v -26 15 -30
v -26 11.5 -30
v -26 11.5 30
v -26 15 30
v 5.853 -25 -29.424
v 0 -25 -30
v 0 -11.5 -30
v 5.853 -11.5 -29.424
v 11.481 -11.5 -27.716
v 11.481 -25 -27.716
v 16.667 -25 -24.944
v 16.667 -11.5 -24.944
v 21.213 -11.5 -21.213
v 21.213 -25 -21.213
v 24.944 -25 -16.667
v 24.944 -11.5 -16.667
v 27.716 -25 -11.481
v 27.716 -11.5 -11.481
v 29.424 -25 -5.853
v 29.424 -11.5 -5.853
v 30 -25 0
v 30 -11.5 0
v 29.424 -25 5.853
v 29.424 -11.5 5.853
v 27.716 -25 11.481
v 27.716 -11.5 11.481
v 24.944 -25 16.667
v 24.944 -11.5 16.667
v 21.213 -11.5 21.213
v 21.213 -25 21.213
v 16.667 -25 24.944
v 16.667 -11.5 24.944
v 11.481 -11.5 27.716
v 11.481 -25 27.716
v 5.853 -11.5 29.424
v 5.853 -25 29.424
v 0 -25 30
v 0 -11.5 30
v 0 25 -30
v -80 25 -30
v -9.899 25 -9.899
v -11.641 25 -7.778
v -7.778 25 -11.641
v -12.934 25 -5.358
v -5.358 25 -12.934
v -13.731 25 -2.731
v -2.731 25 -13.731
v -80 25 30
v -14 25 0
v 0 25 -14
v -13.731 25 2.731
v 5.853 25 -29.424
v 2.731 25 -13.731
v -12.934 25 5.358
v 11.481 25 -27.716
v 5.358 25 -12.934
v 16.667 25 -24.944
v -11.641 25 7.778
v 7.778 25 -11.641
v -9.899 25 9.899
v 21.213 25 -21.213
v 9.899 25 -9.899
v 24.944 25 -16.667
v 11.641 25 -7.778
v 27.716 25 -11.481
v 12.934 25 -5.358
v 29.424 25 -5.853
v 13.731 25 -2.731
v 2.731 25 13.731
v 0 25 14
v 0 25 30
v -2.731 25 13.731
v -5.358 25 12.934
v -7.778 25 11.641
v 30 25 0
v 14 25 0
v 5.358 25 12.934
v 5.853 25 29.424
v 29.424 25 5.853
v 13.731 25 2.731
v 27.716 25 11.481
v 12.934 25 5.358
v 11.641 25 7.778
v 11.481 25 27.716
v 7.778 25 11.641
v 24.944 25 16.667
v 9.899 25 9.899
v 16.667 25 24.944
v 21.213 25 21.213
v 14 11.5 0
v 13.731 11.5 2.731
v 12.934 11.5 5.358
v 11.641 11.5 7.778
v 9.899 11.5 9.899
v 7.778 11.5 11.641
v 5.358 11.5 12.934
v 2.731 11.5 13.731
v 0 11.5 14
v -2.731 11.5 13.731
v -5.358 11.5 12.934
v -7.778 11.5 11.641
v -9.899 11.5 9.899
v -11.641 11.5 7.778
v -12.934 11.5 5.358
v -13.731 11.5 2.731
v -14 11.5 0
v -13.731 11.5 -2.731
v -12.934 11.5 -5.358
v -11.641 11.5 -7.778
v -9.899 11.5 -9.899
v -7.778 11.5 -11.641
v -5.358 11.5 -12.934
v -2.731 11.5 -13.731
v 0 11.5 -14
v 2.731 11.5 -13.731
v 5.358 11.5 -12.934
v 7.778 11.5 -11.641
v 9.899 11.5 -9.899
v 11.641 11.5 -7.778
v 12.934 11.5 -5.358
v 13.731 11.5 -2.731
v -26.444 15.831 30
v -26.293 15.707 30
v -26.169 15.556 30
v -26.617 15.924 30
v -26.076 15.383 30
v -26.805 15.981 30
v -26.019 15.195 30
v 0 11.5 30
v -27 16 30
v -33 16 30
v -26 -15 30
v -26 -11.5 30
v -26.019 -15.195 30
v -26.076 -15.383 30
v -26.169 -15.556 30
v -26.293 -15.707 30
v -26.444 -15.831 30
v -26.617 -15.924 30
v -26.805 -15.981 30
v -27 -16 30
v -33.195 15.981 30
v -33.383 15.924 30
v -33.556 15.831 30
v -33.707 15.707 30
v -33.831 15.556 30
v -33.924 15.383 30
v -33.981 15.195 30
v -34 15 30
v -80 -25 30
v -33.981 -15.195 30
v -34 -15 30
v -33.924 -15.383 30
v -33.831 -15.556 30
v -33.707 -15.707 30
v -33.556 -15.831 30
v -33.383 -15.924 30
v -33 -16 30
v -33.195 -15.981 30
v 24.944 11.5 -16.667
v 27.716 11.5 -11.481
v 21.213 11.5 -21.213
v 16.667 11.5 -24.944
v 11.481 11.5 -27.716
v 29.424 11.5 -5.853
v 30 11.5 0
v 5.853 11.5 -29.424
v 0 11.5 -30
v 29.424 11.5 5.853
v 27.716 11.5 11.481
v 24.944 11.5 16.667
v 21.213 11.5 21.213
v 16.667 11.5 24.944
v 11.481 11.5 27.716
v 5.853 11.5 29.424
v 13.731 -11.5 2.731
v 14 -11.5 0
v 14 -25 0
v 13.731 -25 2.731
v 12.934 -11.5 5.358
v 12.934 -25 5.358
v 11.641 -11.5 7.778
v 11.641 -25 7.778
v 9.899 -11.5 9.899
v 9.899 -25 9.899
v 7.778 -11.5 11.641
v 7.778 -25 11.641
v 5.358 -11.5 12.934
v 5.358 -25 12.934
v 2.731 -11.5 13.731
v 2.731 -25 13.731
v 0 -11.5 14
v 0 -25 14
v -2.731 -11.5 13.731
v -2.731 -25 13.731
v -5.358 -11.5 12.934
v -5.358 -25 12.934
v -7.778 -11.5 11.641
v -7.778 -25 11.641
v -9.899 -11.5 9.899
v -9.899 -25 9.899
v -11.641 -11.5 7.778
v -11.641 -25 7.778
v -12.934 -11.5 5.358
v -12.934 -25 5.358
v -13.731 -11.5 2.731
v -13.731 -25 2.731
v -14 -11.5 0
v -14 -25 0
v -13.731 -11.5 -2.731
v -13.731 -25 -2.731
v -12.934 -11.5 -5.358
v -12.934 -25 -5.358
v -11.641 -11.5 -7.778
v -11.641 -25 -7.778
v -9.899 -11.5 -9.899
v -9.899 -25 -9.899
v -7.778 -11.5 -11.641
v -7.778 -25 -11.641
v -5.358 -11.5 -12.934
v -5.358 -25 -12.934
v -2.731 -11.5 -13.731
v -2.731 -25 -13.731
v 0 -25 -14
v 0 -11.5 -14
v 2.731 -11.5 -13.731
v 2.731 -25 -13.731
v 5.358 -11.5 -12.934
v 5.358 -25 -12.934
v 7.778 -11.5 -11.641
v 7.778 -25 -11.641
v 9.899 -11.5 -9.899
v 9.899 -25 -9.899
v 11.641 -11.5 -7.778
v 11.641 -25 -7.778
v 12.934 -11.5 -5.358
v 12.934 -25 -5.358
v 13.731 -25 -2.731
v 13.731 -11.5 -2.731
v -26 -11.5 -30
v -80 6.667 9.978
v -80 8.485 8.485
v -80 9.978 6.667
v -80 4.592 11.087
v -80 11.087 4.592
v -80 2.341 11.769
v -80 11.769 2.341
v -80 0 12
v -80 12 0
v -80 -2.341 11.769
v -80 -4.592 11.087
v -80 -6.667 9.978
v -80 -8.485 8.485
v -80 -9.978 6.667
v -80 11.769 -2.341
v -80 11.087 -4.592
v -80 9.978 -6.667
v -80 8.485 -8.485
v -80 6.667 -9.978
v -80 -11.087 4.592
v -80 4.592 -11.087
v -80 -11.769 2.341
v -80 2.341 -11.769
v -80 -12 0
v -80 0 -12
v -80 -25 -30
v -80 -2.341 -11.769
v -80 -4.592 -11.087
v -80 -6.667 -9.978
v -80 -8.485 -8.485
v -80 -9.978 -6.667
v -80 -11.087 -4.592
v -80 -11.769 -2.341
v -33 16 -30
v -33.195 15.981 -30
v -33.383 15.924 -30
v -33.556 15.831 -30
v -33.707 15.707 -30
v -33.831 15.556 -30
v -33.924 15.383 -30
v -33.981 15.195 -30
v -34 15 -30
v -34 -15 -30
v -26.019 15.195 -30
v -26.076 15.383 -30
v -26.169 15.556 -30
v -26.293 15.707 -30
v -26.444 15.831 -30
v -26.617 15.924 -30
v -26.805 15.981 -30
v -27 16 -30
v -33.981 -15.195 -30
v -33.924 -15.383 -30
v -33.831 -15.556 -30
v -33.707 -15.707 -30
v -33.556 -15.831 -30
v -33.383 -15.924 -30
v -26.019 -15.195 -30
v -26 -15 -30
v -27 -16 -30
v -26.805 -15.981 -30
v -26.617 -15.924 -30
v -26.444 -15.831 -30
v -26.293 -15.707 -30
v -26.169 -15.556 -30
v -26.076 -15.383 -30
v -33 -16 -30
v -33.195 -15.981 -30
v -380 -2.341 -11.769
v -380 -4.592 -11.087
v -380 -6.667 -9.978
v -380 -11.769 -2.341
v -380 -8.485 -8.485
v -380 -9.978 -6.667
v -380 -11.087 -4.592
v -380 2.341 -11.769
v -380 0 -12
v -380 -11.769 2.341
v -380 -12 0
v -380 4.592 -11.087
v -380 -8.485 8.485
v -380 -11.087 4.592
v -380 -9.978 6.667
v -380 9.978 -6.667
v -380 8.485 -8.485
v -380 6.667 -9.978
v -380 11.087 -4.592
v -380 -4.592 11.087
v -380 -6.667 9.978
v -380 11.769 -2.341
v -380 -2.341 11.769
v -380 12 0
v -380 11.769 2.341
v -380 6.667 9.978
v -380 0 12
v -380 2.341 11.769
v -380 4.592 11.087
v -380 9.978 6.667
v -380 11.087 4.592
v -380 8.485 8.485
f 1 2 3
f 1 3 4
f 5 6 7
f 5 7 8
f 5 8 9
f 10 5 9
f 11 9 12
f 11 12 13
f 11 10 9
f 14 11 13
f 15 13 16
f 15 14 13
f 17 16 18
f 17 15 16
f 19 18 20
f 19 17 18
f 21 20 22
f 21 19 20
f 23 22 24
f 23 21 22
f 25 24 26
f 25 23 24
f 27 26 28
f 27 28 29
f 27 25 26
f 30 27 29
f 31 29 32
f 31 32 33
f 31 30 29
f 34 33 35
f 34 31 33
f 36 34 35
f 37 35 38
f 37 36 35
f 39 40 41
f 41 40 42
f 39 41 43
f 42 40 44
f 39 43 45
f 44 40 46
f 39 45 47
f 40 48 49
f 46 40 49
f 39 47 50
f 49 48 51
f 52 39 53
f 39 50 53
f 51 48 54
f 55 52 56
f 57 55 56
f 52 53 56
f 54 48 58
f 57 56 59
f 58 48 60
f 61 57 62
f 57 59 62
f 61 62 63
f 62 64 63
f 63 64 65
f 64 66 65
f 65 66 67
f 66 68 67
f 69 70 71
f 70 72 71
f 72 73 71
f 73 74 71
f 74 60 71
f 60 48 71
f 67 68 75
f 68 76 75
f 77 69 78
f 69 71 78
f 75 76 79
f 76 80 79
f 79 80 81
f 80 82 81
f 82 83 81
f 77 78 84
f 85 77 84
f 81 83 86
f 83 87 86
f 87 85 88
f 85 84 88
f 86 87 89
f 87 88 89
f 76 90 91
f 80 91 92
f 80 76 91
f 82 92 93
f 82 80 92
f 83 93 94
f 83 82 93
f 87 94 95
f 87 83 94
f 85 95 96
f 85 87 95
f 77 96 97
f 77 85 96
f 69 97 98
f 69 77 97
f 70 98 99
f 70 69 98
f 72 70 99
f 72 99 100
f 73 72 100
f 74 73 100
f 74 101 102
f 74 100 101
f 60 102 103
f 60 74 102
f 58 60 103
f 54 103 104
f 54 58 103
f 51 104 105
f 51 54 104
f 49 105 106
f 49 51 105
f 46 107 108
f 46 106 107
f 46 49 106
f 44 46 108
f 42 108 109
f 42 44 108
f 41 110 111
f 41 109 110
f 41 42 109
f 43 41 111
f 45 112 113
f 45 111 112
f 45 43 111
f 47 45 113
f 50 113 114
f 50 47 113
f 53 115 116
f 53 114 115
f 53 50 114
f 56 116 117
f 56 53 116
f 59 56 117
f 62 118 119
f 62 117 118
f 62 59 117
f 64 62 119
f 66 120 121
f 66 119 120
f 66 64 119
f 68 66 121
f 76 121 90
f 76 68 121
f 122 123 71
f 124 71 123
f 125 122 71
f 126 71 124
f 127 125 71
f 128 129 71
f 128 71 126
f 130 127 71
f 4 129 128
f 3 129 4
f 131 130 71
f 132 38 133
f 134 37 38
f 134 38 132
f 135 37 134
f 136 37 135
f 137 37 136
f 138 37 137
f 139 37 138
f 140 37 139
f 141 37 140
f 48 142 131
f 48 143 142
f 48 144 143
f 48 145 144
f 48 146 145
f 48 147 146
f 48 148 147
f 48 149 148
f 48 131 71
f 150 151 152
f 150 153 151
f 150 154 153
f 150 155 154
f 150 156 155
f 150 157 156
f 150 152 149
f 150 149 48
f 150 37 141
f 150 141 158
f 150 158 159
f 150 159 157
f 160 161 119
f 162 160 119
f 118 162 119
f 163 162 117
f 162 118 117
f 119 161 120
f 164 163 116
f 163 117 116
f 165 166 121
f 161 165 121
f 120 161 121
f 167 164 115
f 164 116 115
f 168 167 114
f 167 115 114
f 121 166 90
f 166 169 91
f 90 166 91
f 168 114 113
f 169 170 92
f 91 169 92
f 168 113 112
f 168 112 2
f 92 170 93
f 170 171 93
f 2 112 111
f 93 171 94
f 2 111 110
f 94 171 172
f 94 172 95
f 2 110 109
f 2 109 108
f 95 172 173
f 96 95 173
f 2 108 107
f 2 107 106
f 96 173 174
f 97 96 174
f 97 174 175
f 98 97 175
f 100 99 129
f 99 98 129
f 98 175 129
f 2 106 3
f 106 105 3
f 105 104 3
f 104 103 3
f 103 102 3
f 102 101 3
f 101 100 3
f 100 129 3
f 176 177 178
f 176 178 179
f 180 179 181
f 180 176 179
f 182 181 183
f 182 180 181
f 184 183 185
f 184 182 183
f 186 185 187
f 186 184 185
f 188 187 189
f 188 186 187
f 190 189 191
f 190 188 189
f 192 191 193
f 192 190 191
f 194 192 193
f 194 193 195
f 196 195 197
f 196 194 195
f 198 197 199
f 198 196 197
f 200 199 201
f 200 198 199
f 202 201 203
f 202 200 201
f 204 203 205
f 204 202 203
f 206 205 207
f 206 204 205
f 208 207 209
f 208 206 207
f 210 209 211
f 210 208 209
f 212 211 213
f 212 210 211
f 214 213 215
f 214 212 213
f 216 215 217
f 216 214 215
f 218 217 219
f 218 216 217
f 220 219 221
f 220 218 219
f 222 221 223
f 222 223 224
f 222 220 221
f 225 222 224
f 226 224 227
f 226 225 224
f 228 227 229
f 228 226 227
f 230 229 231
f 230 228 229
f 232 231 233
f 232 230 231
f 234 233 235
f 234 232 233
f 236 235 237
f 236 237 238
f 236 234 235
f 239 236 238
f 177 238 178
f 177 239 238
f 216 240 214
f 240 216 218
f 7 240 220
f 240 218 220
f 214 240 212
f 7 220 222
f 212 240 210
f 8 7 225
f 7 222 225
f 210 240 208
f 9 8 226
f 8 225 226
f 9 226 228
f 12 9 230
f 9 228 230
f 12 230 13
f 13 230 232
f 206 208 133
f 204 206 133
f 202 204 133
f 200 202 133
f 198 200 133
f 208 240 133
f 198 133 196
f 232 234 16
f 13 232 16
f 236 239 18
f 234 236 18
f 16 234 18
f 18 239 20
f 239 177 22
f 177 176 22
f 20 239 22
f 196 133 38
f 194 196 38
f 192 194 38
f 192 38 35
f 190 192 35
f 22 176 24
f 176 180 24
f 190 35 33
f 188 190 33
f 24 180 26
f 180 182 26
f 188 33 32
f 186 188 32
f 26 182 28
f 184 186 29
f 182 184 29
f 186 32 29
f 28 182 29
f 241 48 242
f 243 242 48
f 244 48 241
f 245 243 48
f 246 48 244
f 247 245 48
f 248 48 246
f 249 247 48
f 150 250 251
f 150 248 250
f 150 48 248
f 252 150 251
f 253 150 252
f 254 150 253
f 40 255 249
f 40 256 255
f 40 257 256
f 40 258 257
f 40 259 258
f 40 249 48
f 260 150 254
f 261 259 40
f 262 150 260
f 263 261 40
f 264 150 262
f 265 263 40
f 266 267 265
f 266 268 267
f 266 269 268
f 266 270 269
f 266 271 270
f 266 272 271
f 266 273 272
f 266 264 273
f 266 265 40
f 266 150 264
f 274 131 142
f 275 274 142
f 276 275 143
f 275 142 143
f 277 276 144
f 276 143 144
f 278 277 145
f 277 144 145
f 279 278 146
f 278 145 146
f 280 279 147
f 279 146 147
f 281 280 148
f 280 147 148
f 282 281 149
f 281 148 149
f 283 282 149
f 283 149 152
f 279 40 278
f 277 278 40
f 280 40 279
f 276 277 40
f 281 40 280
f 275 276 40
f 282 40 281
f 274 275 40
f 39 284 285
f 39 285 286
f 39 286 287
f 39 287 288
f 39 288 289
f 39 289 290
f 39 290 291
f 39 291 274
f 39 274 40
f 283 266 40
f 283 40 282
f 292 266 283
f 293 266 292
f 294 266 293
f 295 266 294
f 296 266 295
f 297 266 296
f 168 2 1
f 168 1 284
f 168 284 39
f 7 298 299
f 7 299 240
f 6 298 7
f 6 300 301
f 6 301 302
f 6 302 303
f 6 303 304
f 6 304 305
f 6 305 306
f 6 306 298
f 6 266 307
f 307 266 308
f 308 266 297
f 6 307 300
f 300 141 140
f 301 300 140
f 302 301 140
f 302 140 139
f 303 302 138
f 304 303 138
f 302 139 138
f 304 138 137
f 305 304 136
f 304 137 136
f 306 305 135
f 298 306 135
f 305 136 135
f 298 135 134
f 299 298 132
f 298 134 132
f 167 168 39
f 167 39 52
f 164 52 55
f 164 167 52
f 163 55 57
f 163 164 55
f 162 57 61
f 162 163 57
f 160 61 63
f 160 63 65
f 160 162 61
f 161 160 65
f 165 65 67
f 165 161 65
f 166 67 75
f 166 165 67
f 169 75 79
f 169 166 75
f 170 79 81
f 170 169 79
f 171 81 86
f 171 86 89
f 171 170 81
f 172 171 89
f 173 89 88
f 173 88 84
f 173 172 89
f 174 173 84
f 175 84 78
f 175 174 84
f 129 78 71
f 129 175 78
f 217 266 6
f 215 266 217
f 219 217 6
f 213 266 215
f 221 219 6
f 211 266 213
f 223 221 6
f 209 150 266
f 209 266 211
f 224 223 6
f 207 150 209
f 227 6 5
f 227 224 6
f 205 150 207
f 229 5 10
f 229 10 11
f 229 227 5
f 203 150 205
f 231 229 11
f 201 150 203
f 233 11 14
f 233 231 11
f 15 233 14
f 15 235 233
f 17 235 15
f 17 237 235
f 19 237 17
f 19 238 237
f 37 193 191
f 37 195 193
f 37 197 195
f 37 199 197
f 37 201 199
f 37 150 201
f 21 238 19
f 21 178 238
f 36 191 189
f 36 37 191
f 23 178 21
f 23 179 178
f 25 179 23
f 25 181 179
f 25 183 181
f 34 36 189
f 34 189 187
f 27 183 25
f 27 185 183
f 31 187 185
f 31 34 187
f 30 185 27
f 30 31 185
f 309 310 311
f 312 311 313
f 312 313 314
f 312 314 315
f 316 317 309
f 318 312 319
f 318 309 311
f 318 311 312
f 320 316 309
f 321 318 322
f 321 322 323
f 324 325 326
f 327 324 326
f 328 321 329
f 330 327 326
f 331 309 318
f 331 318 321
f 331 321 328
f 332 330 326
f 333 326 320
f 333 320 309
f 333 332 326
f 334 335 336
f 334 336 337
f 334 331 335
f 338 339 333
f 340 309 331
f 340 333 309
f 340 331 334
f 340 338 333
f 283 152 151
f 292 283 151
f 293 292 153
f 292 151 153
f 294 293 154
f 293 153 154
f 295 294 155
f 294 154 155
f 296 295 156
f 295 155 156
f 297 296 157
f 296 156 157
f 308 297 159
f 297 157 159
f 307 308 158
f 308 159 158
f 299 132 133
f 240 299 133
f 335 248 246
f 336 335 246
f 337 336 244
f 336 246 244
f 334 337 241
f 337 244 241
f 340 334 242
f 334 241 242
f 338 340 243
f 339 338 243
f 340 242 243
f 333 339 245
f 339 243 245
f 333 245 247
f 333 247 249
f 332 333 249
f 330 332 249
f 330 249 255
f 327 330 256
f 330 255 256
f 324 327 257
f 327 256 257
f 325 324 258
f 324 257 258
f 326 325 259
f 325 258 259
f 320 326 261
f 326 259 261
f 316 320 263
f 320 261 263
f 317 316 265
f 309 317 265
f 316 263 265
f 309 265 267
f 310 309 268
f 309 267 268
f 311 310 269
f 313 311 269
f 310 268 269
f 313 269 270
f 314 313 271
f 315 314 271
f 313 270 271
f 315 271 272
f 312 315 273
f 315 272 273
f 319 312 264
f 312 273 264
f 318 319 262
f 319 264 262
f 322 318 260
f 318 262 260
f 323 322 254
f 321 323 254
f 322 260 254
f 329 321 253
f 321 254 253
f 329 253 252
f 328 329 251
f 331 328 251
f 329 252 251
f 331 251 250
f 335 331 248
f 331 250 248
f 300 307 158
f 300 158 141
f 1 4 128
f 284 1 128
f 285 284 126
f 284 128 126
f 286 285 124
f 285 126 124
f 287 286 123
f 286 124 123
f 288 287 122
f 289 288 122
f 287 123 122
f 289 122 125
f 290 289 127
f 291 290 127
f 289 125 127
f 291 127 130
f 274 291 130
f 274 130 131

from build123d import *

# Parameters (mm, degrees)
CYLINDER_R       = 12
CYLINDER_DEPTH   = 300
EXTRUDE003_DEPTH = 80
SKETCH009_R      = 14
EXTRUDE002_DEPTH = 25


with BuildPart() as cylinder:
    # Cylinder → Cylinder (new body)
    with BuildSketch(Plane.ZY.offset(80)):
        Circle(CYLINDER_R)
    extrude(amount=CYLINDER_DEPTH)


with BuildPart() as extrude003:
    # Sketch010 (on Face2 of Extrude002) → Extrude003 (new body)
    with BuildSketch(Plane.XY.offset(30)):
        with BuildLine():
            Line((30, 11.5), (-26, 11.5))
            Line((-26, 11.5), (-26, 14.999992))
            ThreePointArc((-26, 14.999992), (-26.29289, 15.707104), (-27, 16))
            Line((-27, 16), (-33, 16))
            ThreePointArc((-33, 16), (-33.707107, 15.707107), (-34, 15))
            Line((-34, 15), (-34, -15))
            ThreePointArc((-34, -15), (-33.707107, -15.707107), (-33, -16))
            Line((-33, -16), (-27, -16))
            ThreePointArc((-27, -16), (-26.292893, -15.707107), (-26, -15))
            Line((-26, -15), (-26, -11.5))
            Line((-26, -11.5), (30, -11.5))
            Line((30, -11.5), (30, 11.5))
        make_face()
    extrude(amount=-EXTRUDE003_DEPTH)


with BuildPart() as forkendr:
    # Sketch009 → Extrude002 (new body, symmetric)
    with BuildSketch(Plane.XZ):
        with BuildLine():
            ThreePointArc((0, -30), (30, 0), (0, 30))
            Line((0, 30), (-80, 30))
            Line((-80, 30), (-80, -30))
            Line((-80, -30), (0, -30))
        make_face()
        Circle(SKETCH009_R, mode=Mode.SUBTRACT)
    extrude(amount=EXTRUDE002_DEPTH, both=True)

    # Cut003: cut Extrude003
    add(extrude003.part, mode=Mode.SUBTRACT)

    # Fusion: union Cylinder
    add(cylinder.part)


solid = forkendr.part
